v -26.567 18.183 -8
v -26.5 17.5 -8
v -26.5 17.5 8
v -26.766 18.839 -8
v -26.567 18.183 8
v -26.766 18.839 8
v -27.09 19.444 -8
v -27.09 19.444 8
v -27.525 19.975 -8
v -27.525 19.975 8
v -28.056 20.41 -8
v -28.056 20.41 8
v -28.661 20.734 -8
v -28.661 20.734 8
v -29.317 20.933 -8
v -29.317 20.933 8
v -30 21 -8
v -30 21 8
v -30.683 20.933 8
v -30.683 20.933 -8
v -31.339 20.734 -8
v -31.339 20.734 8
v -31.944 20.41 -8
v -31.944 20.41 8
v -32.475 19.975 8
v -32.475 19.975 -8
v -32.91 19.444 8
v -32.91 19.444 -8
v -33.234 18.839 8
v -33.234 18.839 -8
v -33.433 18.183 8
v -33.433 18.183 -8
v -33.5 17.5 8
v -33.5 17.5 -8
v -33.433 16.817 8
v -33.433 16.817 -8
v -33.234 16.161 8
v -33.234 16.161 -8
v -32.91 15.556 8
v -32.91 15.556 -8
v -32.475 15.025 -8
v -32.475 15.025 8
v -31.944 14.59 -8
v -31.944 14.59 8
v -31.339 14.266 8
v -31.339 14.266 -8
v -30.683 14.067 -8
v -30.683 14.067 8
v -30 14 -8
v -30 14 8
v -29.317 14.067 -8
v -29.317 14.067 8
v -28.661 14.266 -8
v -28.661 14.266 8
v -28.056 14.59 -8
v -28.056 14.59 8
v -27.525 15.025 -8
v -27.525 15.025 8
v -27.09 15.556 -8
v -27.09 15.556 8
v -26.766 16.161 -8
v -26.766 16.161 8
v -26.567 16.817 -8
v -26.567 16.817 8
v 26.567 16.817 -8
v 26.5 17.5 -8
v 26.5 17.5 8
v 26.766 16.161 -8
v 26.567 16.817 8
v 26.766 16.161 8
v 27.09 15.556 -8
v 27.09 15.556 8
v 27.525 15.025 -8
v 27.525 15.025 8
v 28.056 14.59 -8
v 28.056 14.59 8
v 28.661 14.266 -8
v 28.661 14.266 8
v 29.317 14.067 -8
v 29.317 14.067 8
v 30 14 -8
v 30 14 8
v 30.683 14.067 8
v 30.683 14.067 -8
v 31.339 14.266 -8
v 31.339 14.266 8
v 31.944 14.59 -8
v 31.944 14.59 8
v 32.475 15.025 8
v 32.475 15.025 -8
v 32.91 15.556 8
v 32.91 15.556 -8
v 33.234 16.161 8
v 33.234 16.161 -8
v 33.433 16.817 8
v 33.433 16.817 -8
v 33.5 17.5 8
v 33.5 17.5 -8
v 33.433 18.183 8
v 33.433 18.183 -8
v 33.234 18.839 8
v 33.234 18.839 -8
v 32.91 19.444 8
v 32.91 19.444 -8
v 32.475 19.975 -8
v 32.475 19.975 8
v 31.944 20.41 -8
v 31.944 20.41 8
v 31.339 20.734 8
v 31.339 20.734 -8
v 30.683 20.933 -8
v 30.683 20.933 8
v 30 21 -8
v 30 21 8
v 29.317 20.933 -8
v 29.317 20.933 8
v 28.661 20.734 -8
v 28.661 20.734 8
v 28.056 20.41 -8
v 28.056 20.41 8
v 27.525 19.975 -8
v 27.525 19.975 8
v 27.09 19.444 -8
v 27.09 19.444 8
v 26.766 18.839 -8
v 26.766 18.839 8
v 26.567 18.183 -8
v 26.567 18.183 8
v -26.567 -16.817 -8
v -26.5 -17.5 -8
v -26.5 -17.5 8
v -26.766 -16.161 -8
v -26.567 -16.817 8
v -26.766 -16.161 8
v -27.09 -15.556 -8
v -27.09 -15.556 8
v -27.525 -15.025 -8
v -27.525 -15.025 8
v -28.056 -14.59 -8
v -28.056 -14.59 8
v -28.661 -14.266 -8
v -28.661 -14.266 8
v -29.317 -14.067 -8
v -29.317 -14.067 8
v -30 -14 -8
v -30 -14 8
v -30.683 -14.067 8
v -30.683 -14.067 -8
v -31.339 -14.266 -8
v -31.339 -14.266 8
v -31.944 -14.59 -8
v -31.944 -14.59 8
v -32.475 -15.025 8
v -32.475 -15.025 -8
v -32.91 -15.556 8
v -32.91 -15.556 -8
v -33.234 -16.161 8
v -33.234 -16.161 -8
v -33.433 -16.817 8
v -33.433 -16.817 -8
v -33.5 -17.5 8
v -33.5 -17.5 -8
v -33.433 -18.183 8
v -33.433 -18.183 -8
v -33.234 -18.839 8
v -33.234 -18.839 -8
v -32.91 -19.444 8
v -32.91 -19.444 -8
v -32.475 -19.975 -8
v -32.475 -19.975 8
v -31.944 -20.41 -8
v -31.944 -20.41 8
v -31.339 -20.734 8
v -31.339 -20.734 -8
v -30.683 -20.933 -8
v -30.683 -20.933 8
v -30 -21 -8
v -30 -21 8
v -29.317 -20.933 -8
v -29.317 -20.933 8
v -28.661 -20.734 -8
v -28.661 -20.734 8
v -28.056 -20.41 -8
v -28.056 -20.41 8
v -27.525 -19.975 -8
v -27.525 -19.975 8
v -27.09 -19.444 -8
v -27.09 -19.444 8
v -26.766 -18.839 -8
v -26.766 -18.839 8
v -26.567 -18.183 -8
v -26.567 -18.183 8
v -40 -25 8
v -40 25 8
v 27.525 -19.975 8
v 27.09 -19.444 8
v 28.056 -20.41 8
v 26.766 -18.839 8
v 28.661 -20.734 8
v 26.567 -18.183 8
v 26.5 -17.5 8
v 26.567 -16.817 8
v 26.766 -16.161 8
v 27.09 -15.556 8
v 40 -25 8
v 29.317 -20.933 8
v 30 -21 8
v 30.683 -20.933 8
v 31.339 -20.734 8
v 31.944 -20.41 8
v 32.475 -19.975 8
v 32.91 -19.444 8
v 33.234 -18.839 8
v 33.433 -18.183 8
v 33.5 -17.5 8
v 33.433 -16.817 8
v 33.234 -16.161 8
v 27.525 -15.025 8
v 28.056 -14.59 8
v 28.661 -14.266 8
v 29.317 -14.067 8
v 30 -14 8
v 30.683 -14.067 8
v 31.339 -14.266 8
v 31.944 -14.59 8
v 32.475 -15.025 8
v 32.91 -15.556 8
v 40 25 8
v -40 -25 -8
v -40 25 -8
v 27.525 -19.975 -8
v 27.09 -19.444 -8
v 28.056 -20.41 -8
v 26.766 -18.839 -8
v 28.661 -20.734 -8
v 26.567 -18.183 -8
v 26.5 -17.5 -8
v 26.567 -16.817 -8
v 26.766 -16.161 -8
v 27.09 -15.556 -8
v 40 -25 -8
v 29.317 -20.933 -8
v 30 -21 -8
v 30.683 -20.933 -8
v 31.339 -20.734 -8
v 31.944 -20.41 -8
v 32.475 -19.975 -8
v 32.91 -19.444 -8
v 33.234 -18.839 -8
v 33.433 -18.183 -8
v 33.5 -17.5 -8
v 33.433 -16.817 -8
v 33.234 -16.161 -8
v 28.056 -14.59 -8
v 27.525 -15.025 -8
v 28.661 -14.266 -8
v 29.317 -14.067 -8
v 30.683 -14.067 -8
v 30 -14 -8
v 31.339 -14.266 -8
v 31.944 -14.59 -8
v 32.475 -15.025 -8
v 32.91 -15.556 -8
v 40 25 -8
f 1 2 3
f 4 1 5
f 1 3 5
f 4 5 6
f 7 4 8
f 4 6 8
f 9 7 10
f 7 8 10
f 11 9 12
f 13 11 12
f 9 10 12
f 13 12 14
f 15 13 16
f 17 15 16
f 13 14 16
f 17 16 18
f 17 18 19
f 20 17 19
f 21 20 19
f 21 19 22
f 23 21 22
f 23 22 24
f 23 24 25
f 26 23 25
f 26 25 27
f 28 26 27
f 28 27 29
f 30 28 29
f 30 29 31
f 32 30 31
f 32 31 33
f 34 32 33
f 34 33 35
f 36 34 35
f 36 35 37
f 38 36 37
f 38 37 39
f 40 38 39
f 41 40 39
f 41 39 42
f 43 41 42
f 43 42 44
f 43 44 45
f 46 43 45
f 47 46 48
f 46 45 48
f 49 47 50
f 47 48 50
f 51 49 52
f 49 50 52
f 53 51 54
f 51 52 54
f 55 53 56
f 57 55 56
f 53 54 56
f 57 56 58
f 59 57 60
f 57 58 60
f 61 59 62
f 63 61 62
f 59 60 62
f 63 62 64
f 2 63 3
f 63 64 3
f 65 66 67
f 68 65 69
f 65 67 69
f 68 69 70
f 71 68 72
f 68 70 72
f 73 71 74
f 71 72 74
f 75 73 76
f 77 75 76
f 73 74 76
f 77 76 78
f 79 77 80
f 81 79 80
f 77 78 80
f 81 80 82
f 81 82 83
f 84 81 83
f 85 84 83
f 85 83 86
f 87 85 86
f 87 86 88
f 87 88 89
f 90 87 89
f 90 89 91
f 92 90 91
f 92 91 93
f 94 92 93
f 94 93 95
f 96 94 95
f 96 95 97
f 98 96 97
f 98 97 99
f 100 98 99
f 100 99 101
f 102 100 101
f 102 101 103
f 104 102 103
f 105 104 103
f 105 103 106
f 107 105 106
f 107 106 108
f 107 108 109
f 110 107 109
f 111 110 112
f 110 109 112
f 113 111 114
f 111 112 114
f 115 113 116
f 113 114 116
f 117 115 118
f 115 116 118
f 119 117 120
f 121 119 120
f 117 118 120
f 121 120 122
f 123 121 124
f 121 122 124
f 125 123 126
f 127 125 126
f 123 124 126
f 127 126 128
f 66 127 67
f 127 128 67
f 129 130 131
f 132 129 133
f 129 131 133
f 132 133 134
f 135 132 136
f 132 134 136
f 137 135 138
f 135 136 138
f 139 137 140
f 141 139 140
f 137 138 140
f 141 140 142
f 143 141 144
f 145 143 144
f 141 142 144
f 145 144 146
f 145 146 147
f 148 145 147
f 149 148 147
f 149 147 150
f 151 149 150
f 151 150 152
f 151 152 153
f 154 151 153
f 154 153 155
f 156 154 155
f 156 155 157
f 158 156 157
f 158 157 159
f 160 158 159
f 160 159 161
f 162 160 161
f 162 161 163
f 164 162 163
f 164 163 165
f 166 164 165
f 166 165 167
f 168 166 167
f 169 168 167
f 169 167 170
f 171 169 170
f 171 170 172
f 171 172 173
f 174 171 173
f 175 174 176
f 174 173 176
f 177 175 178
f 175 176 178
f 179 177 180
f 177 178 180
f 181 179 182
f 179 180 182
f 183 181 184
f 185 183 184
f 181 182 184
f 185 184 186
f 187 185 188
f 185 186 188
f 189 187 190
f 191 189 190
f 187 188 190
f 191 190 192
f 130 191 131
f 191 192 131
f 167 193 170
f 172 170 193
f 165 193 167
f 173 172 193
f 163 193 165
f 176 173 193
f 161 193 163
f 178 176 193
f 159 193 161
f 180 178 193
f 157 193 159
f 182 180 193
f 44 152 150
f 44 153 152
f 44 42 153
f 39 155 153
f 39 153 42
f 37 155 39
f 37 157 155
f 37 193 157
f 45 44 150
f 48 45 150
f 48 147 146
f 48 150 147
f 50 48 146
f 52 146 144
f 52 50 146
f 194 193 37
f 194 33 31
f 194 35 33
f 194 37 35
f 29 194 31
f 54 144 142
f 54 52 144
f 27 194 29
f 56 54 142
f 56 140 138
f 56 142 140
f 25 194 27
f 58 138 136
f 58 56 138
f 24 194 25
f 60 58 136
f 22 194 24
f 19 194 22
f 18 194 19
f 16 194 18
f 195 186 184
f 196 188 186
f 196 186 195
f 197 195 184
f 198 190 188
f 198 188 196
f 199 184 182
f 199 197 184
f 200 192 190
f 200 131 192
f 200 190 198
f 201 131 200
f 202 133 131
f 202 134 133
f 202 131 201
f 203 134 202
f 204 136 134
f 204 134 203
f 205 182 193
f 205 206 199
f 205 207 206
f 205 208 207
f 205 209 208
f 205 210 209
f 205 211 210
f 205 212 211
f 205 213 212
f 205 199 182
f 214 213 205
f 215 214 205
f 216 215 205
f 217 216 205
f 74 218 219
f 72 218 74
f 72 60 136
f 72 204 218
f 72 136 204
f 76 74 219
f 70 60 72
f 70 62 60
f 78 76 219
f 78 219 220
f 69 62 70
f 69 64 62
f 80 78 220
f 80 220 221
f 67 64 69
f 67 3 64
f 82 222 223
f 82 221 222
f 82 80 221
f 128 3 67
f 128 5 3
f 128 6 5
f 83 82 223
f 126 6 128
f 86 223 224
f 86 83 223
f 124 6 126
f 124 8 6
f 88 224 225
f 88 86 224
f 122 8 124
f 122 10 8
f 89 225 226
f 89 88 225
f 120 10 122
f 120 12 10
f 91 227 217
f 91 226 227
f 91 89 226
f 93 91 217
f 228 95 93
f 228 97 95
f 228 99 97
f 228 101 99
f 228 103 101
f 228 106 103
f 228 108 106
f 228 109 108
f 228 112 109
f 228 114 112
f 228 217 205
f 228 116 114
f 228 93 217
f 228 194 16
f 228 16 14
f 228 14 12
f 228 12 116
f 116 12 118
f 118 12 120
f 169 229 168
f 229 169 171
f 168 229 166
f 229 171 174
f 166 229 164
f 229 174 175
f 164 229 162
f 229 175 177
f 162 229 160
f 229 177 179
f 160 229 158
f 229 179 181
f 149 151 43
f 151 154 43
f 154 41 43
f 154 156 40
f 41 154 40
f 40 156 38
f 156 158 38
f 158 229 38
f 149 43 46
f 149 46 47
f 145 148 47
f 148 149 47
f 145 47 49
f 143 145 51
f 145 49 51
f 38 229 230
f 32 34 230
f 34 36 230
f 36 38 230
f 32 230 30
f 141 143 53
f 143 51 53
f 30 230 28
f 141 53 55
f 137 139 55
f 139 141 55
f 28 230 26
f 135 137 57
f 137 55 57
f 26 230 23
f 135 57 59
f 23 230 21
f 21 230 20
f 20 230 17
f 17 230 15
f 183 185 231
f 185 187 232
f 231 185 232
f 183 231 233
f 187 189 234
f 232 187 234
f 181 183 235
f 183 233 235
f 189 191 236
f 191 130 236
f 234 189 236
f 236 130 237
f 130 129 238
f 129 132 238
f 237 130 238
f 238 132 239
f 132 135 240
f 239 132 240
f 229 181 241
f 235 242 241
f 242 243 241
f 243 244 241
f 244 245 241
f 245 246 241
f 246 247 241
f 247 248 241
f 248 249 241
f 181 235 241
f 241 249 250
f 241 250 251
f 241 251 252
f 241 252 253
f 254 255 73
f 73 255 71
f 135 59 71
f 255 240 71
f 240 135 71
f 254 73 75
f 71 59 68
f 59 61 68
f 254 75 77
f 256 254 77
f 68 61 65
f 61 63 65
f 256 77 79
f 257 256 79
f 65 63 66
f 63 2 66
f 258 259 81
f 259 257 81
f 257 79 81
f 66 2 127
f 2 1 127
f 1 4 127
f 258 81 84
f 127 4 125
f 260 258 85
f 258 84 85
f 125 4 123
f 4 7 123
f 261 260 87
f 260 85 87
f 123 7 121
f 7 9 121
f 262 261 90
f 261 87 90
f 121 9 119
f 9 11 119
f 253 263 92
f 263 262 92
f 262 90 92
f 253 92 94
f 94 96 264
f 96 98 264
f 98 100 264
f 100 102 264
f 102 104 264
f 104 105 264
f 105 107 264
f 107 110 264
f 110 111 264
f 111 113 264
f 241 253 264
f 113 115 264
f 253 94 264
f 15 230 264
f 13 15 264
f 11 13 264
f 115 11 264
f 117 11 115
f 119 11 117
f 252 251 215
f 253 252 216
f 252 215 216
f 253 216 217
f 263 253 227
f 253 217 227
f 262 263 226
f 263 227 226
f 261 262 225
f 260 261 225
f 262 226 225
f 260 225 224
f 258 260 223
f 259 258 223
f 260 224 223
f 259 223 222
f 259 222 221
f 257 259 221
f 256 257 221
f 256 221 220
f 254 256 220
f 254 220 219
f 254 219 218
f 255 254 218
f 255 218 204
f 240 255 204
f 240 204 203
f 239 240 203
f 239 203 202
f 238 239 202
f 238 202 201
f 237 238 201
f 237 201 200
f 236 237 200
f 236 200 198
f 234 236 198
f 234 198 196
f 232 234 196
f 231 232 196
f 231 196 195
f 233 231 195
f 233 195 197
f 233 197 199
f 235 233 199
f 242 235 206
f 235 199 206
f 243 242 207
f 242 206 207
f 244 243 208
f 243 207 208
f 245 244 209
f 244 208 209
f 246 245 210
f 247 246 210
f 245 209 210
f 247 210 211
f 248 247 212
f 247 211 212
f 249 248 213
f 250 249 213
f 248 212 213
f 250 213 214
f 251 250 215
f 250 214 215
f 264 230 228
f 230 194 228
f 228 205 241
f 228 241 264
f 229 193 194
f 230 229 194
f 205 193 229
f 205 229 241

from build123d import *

# Parameters (mm, degrees)
ESQUISSE1_W             = 80
ESQUISSE1_H             = 50
BOSS_EXTRU_1_DEPTH      = 8
ESQUISSE2_R             = 3.5
ENL_V_MAT_EXTRU_1_DEPTH = 17


with BuildPart() as part:
    # Esquisse1 → Boss.-Extru.1 (new body, symmetric)
    with BuildSketch(Plane.XY):
        Rectangle(ESQUISSE1_W, ESQUISSE1_H)
    extrude(amount=BOSS_EXTRU_1_DEPTH, both=True)

    # Esquisse2 → Enlèv. mat.-Extru.1 (cut, through all)
    with BuildSketch(Plane.XY.offset(8)):
        with Locations((-30, 17.5)):
            Circle(ESQUISSE2_R)
        with Locations(Location((30, 17.5, 0), (0, 0, 180))):  # turned: the seam where the file's is
            Circle(ESQUISSE2_R)
        with Locations((-30, -17.5)):
            Circle(ESQUISSE2_R)
        with Locations((30, -17.5)):
            Circle(ESQUISSE2_R)
    extrude(amount=-ENL_V_MAT_EXTRU_1_DEPTH, mode=Mode.SUBTRACT)


solid = part.part
